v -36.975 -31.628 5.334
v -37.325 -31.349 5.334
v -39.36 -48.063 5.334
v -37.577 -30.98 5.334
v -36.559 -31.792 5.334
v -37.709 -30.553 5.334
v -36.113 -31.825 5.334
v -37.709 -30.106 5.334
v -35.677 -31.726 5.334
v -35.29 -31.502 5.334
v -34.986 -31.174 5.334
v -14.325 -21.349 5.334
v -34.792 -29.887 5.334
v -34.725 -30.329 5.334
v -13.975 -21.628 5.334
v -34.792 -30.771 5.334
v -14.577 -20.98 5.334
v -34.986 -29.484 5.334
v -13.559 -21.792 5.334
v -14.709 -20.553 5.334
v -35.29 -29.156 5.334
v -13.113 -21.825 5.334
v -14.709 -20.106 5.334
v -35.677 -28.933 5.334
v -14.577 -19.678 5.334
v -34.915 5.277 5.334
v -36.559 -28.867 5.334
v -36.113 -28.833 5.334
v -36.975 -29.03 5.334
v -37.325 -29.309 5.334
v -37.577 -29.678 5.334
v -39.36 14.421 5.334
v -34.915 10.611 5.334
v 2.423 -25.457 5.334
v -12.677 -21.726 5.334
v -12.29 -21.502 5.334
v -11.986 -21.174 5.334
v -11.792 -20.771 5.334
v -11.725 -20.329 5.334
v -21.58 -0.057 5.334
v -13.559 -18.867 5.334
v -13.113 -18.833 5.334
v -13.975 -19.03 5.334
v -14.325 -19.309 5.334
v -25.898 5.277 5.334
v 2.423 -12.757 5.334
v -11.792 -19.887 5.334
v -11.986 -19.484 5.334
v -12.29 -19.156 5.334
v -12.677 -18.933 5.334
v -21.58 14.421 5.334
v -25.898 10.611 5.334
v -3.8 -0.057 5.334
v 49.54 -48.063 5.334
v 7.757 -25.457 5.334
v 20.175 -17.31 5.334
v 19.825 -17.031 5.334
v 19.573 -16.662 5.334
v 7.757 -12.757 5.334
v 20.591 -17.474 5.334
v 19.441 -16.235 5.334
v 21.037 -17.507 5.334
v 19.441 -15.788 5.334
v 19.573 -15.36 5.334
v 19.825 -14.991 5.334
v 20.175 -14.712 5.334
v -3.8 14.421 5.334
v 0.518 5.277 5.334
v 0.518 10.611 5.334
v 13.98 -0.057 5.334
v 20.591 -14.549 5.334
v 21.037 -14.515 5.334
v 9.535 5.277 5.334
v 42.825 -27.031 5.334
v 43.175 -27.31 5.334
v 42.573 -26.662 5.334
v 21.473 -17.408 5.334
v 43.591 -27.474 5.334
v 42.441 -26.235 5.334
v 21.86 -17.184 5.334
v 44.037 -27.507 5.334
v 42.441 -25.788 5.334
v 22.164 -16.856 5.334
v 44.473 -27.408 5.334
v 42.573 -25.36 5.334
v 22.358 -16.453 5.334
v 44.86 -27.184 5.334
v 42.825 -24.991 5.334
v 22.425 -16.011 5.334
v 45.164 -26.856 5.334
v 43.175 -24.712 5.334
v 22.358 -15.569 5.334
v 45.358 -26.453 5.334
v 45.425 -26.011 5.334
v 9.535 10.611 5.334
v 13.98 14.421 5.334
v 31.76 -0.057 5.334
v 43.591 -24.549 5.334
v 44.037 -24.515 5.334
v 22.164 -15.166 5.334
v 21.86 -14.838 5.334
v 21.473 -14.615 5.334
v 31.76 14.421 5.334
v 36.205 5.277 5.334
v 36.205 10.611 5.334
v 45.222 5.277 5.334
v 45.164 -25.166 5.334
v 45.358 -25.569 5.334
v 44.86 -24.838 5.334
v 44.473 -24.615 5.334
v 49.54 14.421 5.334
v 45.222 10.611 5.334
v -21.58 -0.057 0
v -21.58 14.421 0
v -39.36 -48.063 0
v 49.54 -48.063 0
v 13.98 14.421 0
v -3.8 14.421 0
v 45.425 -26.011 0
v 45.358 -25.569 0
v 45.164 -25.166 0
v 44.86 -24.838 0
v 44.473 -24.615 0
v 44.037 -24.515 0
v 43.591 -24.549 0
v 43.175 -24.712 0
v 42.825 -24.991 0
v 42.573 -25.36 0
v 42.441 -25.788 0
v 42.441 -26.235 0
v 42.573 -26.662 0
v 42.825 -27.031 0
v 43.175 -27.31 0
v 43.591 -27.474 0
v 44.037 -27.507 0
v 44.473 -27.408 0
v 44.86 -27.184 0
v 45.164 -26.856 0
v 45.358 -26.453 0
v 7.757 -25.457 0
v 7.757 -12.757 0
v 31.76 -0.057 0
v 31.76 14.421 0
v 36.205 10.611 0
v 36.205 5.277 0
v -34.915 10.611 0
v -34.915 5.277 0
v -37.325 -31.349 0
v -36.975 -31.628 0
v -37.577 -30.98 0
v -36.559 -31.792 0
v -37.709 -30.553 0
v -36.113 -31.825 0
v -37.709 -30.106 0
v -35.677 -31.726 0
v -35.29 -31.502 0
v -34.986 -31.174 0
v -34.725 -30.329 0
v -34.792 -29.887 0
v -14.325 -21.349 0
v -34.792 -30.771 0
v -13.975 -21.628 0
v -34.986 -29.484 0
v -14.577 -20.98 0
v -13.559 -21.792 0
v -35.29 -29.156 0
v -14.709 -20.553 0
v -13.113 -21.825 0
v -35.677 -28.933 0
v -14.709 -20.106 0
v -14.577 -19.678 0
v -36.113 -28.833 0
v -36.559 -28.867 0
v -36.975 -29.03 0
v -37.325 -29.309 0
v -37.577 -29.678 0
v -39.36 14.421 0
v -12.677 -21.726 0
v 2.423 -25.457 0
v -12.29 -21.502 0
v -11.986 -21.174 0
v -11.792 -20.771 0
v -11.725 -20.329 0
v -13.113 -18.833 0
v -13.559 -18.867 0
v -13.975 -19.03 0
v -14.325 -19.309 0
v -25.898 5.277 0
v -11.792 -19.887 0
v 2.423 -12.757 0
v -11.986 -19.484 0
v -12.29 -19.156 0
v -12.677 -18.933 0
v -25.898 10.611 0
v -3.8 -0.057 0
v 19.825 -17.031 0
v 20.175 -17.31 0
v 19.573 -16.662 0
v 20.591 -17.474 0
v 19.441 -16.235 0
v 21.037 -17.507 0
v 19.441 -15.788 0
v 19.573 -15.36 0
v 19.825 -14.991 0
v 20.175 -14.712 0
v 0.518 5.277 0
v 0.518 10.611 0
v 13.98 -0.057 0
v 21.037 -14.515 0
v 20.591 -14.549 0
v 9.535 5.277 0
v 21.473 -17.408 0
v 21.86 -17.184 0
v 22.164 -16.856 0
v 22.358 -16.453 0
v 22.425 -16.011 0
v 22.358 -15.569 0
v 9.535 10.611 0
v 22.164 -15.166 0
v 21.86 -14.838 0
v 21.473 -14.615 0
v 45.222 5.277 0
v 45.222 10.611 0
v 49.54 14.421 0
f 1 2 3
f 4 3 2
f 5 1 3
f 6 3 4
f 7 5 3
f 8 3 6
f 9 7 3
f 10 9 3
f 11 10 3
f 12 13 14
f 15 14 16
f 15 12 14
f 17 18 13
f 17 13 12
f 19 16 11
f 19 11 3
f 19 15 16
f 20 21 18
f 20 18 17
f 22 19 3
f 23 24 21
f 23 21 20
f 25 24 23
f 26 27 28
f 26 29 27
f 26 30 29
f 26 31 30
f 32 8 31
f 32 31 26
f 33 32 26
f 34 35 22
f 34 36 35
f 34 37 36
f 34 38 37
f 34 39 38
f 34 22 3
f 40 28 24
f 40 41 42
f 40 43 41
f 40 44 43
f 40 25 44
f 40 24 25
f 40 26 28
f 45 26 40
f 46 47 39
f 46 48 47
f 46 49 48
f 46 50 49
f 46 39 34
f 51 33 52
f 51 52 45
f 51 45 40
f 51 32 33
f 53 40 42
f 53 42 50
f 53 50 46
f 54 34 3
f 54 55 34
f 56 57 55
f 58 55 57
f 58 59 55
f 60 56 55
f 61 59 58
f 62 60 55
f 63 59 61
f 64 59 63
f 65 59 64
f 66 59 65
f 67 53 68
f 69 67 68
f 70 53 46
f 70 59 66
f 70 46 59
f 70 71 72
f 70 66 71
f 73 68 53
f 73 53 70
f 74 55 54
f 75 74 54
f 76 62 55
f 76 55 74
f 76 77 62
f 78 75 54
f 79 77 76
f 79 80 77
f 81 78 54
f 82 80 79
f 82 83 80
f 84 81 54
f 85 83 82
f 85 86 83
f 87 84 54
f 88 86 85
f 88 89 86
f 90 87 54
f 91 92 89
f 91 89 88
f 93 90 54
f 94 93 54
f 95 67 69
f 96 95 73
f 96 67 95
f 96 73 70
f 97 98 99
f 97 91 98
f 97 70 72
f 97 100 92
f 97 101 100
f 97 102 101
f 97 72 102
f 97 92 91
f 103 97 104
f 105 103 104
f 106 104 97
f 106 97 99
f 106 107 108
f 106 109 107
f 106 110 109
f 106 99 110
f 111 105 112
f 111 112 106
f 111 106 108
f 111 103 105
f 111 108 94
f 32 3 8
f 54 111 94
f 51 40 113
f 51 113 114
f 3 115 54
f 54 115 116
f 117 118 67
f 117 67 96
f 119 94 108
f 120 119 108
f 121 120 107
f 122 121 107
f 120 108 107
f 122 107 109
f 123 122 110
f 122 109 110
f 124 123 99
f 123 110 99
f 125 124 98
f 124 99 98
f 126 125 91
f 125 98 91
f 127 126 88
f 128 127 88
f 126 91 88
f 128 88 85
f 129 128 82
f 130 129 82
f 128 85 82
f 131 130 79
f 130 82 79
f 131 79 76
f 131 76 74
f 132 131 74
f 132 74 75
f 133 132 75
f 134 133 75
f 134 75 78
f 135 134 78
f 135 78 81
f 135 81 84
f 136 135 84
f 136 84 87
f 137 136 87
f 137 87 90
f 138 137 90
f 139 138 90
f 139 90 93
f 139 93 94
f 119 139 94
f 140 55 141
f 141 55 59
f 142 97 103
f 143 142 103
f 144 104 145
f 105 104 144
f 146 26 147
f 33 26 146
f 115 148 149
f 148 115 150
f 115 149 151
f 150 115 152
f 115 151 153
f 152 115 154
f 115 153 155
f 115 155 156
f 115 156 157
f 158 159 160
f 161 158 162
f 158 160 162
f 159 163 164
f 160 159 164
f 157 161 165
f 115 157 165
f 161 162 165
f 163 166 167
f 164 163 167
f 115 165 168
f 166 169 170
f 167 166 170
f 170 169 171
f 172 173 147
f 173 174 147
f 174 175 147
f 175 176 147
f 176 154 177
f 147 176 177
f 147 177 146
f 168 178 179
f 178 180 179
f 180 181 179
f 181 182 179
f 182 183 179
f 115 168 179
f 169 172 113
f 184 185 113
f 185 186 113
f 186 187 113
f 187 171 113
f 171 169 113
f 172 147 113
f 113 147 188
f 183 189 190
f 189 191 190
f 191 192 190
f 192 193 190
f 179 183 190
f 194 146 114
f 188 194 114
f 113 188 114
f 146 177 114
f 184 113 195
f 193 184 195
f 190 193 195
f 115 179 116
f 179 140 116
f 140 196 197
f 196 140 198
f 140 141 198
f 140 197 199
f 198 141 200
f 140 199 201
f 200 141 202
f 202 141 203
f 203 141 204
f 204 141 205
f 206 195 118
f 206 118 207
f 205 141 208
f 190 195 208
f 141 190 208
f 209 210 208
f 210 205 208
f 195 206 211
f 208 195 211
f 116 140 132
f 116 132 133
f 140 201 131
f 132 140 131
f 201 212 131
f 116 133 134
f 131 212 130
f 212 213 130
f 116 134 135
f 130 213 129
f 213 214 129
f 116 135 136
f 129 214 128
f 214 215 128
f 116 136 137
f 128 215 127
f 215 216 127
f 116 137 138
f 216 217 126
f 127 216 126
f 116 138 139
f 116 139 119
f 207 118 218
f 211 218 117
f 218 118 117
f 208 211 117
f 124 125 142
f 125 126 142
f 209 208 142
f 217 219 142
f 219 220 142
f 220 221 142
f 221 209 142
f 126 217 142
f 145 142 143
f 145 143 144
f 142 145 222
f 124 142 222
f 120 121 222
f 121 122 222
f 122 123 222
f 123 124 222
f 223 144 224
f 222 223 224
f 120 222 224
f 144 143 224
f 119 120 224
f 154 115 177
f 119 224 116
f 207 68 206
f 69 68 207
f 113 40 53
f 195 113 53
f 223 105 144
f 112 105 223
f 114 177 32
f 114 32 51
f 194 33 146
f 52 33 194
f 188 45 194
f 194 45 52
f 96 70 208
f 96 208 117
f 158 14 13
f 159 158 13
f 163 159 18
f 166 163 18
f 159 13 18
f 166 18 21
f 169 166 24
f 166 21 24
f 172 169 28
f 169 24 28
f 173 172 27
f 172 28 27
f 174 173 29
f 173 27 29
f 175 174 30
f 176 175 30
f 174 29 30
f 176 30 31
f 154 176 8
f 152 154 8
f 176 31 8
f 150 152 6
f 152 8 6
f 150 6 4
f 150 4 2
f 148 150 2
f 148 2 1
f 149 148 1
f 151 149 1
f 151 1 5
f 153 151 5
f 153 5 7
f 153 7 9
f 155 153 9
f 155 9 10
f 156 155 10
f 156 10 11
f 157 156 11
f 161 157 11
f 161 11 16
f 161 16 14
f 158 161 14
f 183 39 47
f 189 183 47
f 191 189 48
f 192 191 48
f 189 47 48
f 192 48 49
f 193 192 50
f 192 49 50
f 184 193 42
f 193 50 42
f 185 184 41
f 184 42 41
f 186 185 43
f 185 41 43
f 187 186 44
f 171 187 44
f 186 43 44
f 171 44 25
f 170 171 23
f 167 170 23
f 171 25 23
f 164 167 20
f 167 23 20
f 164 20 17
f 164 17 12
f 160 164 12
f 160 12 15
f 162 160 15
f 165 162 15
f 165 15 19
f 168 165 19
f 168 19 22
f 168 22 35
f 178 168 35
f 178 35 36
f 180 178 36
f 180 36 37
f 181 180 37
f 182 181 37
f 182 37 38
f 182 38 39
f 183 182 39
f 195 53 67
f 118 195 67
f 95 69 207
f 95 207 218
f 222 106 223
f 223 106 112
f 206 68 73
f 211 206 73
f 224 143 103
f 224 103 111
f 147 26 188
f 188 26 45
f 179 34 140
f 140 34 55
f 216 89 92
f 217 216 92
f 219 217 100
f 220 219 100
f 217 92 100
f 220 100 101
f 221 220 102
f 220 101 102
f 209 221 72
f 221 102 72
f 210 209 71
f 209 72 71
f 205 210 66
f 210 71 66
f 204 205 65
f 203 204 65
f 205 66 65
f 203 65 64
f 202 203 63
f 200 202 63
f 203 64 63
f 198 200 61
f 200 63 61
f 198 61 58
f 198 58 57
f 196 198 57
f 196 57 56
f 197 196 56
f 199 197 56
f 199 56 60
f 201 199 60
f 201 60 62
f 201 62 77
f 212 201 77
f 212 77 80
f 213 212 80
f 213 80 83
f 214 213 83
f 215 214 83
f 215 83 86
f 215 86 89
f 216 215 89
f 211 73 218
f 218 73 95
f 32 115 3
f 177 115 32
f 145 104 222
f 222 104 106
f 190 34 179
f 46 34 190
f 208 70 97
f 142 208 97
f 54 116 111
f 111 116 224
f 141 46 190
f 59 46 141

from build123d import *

# Parameters (mm, degrees)
SKETCH1_W           = 88.9
SKETCH1_H           = 62.484
BOSS_EXTRUDE1_DEPTH = 5.334
SKETCH2_W           = 17.78
SKETCH2_H           = 14.478
CUT_EXTRUDE1_DEPTH  = 70.229357574
SKETCH3_W           = 9.017
SKETCH3_H           = 5.334
CUT_EXTRUDE2_DEPTH  = 70.229357574
SKETCH5_W           = 5.334
SKETCH5_H           = 12.7
CUT_EXTRUDE3_DEPTH  = 70.229357574
SKETCH7_R           = 1.5
CUT_EXTRUDE4_DEPTH  = 70.229357574


with BuildPart() as part:
    # Sketch1 → Boss-Extrude1 (new body)
    with BuildSketch(Plane.XY):
        with Locations((5.089694656, -16.821198473)):
            Rectangle(SKETCH1_W, SKETCH1_H)
    extrude(amount=BOSS_EXTRUDE1_DEPTH)

    # Sketch2 → Cut-Extrude1 (cut, through all)
    with BuildSketch(Plane.XY.offset(5.334)):
        with Locations((-12.690305344, 7.181801527)):
            Rectangle(SKETCH2_W, SKETCH2_H)
        with Locations((22.869694656, 7.181801527)):
            Rectangle(SKETCH2_W, SKETCH2_H)
    extrude(amount=-CUT_EXTRUDE1_DEPTH, mode=Mode.SUBTRACT)

    # Sketch3 → Cut-Extrude2 (cut, through all)
    with BuildSketch(Plane.XY.offset(5.334)):
        with Locations((-30.406805344, 7.943801527)):
            Rectangle(SKETCH3_W, SKETCH3_H)
        with Locations((5.026194656, 7.943801527)):
            Rectangle(SKETCH3_W, SKETCH3_H)
        with Locations((40.713194656, 7.943801527)):
            Rectangle(SKETCH3_W, SKETCH3_H)
    extrude(amount=-CUT_EXTRUDE2_DEPTH, mode=Mode.SUBTRACT)

    # Sketch5 → Cut-Extrude3 (cut, through all)
    with BuildSketch(Plane.XY.offset(5.334)):
        with Locations((5.089694656, -19.107198473)):
            Rectangle(SKETCH5_W, SKETCH5_H)
    extrude(amount=-CUT_EXTRUDE3_DEPTH, mode=Mode.SUBTRACT)

    # Sketch7 → Cut-Extrude4 (cut, through all)
    with BuildSketch(Plane.XY.offset(5.334)):
        with Locations((-36.225305344, -30.329198473)):
            Circle(SKETCH7_R)
        with Locations((20.924694656, -16.011198473)):
            Circle(SKETCH7_R)
        with Locations((43.924694656, -26.011198473)):
            Circle(SKETCH7_R)
        with Locations((-13.225305344, -20.329198473)):
            Circle(SKETCH7_R)
    extrude(amount=-CUT_EXTRUDE4_DEPTH, mode=Mode.SUBTRACT)


solid = part.part
